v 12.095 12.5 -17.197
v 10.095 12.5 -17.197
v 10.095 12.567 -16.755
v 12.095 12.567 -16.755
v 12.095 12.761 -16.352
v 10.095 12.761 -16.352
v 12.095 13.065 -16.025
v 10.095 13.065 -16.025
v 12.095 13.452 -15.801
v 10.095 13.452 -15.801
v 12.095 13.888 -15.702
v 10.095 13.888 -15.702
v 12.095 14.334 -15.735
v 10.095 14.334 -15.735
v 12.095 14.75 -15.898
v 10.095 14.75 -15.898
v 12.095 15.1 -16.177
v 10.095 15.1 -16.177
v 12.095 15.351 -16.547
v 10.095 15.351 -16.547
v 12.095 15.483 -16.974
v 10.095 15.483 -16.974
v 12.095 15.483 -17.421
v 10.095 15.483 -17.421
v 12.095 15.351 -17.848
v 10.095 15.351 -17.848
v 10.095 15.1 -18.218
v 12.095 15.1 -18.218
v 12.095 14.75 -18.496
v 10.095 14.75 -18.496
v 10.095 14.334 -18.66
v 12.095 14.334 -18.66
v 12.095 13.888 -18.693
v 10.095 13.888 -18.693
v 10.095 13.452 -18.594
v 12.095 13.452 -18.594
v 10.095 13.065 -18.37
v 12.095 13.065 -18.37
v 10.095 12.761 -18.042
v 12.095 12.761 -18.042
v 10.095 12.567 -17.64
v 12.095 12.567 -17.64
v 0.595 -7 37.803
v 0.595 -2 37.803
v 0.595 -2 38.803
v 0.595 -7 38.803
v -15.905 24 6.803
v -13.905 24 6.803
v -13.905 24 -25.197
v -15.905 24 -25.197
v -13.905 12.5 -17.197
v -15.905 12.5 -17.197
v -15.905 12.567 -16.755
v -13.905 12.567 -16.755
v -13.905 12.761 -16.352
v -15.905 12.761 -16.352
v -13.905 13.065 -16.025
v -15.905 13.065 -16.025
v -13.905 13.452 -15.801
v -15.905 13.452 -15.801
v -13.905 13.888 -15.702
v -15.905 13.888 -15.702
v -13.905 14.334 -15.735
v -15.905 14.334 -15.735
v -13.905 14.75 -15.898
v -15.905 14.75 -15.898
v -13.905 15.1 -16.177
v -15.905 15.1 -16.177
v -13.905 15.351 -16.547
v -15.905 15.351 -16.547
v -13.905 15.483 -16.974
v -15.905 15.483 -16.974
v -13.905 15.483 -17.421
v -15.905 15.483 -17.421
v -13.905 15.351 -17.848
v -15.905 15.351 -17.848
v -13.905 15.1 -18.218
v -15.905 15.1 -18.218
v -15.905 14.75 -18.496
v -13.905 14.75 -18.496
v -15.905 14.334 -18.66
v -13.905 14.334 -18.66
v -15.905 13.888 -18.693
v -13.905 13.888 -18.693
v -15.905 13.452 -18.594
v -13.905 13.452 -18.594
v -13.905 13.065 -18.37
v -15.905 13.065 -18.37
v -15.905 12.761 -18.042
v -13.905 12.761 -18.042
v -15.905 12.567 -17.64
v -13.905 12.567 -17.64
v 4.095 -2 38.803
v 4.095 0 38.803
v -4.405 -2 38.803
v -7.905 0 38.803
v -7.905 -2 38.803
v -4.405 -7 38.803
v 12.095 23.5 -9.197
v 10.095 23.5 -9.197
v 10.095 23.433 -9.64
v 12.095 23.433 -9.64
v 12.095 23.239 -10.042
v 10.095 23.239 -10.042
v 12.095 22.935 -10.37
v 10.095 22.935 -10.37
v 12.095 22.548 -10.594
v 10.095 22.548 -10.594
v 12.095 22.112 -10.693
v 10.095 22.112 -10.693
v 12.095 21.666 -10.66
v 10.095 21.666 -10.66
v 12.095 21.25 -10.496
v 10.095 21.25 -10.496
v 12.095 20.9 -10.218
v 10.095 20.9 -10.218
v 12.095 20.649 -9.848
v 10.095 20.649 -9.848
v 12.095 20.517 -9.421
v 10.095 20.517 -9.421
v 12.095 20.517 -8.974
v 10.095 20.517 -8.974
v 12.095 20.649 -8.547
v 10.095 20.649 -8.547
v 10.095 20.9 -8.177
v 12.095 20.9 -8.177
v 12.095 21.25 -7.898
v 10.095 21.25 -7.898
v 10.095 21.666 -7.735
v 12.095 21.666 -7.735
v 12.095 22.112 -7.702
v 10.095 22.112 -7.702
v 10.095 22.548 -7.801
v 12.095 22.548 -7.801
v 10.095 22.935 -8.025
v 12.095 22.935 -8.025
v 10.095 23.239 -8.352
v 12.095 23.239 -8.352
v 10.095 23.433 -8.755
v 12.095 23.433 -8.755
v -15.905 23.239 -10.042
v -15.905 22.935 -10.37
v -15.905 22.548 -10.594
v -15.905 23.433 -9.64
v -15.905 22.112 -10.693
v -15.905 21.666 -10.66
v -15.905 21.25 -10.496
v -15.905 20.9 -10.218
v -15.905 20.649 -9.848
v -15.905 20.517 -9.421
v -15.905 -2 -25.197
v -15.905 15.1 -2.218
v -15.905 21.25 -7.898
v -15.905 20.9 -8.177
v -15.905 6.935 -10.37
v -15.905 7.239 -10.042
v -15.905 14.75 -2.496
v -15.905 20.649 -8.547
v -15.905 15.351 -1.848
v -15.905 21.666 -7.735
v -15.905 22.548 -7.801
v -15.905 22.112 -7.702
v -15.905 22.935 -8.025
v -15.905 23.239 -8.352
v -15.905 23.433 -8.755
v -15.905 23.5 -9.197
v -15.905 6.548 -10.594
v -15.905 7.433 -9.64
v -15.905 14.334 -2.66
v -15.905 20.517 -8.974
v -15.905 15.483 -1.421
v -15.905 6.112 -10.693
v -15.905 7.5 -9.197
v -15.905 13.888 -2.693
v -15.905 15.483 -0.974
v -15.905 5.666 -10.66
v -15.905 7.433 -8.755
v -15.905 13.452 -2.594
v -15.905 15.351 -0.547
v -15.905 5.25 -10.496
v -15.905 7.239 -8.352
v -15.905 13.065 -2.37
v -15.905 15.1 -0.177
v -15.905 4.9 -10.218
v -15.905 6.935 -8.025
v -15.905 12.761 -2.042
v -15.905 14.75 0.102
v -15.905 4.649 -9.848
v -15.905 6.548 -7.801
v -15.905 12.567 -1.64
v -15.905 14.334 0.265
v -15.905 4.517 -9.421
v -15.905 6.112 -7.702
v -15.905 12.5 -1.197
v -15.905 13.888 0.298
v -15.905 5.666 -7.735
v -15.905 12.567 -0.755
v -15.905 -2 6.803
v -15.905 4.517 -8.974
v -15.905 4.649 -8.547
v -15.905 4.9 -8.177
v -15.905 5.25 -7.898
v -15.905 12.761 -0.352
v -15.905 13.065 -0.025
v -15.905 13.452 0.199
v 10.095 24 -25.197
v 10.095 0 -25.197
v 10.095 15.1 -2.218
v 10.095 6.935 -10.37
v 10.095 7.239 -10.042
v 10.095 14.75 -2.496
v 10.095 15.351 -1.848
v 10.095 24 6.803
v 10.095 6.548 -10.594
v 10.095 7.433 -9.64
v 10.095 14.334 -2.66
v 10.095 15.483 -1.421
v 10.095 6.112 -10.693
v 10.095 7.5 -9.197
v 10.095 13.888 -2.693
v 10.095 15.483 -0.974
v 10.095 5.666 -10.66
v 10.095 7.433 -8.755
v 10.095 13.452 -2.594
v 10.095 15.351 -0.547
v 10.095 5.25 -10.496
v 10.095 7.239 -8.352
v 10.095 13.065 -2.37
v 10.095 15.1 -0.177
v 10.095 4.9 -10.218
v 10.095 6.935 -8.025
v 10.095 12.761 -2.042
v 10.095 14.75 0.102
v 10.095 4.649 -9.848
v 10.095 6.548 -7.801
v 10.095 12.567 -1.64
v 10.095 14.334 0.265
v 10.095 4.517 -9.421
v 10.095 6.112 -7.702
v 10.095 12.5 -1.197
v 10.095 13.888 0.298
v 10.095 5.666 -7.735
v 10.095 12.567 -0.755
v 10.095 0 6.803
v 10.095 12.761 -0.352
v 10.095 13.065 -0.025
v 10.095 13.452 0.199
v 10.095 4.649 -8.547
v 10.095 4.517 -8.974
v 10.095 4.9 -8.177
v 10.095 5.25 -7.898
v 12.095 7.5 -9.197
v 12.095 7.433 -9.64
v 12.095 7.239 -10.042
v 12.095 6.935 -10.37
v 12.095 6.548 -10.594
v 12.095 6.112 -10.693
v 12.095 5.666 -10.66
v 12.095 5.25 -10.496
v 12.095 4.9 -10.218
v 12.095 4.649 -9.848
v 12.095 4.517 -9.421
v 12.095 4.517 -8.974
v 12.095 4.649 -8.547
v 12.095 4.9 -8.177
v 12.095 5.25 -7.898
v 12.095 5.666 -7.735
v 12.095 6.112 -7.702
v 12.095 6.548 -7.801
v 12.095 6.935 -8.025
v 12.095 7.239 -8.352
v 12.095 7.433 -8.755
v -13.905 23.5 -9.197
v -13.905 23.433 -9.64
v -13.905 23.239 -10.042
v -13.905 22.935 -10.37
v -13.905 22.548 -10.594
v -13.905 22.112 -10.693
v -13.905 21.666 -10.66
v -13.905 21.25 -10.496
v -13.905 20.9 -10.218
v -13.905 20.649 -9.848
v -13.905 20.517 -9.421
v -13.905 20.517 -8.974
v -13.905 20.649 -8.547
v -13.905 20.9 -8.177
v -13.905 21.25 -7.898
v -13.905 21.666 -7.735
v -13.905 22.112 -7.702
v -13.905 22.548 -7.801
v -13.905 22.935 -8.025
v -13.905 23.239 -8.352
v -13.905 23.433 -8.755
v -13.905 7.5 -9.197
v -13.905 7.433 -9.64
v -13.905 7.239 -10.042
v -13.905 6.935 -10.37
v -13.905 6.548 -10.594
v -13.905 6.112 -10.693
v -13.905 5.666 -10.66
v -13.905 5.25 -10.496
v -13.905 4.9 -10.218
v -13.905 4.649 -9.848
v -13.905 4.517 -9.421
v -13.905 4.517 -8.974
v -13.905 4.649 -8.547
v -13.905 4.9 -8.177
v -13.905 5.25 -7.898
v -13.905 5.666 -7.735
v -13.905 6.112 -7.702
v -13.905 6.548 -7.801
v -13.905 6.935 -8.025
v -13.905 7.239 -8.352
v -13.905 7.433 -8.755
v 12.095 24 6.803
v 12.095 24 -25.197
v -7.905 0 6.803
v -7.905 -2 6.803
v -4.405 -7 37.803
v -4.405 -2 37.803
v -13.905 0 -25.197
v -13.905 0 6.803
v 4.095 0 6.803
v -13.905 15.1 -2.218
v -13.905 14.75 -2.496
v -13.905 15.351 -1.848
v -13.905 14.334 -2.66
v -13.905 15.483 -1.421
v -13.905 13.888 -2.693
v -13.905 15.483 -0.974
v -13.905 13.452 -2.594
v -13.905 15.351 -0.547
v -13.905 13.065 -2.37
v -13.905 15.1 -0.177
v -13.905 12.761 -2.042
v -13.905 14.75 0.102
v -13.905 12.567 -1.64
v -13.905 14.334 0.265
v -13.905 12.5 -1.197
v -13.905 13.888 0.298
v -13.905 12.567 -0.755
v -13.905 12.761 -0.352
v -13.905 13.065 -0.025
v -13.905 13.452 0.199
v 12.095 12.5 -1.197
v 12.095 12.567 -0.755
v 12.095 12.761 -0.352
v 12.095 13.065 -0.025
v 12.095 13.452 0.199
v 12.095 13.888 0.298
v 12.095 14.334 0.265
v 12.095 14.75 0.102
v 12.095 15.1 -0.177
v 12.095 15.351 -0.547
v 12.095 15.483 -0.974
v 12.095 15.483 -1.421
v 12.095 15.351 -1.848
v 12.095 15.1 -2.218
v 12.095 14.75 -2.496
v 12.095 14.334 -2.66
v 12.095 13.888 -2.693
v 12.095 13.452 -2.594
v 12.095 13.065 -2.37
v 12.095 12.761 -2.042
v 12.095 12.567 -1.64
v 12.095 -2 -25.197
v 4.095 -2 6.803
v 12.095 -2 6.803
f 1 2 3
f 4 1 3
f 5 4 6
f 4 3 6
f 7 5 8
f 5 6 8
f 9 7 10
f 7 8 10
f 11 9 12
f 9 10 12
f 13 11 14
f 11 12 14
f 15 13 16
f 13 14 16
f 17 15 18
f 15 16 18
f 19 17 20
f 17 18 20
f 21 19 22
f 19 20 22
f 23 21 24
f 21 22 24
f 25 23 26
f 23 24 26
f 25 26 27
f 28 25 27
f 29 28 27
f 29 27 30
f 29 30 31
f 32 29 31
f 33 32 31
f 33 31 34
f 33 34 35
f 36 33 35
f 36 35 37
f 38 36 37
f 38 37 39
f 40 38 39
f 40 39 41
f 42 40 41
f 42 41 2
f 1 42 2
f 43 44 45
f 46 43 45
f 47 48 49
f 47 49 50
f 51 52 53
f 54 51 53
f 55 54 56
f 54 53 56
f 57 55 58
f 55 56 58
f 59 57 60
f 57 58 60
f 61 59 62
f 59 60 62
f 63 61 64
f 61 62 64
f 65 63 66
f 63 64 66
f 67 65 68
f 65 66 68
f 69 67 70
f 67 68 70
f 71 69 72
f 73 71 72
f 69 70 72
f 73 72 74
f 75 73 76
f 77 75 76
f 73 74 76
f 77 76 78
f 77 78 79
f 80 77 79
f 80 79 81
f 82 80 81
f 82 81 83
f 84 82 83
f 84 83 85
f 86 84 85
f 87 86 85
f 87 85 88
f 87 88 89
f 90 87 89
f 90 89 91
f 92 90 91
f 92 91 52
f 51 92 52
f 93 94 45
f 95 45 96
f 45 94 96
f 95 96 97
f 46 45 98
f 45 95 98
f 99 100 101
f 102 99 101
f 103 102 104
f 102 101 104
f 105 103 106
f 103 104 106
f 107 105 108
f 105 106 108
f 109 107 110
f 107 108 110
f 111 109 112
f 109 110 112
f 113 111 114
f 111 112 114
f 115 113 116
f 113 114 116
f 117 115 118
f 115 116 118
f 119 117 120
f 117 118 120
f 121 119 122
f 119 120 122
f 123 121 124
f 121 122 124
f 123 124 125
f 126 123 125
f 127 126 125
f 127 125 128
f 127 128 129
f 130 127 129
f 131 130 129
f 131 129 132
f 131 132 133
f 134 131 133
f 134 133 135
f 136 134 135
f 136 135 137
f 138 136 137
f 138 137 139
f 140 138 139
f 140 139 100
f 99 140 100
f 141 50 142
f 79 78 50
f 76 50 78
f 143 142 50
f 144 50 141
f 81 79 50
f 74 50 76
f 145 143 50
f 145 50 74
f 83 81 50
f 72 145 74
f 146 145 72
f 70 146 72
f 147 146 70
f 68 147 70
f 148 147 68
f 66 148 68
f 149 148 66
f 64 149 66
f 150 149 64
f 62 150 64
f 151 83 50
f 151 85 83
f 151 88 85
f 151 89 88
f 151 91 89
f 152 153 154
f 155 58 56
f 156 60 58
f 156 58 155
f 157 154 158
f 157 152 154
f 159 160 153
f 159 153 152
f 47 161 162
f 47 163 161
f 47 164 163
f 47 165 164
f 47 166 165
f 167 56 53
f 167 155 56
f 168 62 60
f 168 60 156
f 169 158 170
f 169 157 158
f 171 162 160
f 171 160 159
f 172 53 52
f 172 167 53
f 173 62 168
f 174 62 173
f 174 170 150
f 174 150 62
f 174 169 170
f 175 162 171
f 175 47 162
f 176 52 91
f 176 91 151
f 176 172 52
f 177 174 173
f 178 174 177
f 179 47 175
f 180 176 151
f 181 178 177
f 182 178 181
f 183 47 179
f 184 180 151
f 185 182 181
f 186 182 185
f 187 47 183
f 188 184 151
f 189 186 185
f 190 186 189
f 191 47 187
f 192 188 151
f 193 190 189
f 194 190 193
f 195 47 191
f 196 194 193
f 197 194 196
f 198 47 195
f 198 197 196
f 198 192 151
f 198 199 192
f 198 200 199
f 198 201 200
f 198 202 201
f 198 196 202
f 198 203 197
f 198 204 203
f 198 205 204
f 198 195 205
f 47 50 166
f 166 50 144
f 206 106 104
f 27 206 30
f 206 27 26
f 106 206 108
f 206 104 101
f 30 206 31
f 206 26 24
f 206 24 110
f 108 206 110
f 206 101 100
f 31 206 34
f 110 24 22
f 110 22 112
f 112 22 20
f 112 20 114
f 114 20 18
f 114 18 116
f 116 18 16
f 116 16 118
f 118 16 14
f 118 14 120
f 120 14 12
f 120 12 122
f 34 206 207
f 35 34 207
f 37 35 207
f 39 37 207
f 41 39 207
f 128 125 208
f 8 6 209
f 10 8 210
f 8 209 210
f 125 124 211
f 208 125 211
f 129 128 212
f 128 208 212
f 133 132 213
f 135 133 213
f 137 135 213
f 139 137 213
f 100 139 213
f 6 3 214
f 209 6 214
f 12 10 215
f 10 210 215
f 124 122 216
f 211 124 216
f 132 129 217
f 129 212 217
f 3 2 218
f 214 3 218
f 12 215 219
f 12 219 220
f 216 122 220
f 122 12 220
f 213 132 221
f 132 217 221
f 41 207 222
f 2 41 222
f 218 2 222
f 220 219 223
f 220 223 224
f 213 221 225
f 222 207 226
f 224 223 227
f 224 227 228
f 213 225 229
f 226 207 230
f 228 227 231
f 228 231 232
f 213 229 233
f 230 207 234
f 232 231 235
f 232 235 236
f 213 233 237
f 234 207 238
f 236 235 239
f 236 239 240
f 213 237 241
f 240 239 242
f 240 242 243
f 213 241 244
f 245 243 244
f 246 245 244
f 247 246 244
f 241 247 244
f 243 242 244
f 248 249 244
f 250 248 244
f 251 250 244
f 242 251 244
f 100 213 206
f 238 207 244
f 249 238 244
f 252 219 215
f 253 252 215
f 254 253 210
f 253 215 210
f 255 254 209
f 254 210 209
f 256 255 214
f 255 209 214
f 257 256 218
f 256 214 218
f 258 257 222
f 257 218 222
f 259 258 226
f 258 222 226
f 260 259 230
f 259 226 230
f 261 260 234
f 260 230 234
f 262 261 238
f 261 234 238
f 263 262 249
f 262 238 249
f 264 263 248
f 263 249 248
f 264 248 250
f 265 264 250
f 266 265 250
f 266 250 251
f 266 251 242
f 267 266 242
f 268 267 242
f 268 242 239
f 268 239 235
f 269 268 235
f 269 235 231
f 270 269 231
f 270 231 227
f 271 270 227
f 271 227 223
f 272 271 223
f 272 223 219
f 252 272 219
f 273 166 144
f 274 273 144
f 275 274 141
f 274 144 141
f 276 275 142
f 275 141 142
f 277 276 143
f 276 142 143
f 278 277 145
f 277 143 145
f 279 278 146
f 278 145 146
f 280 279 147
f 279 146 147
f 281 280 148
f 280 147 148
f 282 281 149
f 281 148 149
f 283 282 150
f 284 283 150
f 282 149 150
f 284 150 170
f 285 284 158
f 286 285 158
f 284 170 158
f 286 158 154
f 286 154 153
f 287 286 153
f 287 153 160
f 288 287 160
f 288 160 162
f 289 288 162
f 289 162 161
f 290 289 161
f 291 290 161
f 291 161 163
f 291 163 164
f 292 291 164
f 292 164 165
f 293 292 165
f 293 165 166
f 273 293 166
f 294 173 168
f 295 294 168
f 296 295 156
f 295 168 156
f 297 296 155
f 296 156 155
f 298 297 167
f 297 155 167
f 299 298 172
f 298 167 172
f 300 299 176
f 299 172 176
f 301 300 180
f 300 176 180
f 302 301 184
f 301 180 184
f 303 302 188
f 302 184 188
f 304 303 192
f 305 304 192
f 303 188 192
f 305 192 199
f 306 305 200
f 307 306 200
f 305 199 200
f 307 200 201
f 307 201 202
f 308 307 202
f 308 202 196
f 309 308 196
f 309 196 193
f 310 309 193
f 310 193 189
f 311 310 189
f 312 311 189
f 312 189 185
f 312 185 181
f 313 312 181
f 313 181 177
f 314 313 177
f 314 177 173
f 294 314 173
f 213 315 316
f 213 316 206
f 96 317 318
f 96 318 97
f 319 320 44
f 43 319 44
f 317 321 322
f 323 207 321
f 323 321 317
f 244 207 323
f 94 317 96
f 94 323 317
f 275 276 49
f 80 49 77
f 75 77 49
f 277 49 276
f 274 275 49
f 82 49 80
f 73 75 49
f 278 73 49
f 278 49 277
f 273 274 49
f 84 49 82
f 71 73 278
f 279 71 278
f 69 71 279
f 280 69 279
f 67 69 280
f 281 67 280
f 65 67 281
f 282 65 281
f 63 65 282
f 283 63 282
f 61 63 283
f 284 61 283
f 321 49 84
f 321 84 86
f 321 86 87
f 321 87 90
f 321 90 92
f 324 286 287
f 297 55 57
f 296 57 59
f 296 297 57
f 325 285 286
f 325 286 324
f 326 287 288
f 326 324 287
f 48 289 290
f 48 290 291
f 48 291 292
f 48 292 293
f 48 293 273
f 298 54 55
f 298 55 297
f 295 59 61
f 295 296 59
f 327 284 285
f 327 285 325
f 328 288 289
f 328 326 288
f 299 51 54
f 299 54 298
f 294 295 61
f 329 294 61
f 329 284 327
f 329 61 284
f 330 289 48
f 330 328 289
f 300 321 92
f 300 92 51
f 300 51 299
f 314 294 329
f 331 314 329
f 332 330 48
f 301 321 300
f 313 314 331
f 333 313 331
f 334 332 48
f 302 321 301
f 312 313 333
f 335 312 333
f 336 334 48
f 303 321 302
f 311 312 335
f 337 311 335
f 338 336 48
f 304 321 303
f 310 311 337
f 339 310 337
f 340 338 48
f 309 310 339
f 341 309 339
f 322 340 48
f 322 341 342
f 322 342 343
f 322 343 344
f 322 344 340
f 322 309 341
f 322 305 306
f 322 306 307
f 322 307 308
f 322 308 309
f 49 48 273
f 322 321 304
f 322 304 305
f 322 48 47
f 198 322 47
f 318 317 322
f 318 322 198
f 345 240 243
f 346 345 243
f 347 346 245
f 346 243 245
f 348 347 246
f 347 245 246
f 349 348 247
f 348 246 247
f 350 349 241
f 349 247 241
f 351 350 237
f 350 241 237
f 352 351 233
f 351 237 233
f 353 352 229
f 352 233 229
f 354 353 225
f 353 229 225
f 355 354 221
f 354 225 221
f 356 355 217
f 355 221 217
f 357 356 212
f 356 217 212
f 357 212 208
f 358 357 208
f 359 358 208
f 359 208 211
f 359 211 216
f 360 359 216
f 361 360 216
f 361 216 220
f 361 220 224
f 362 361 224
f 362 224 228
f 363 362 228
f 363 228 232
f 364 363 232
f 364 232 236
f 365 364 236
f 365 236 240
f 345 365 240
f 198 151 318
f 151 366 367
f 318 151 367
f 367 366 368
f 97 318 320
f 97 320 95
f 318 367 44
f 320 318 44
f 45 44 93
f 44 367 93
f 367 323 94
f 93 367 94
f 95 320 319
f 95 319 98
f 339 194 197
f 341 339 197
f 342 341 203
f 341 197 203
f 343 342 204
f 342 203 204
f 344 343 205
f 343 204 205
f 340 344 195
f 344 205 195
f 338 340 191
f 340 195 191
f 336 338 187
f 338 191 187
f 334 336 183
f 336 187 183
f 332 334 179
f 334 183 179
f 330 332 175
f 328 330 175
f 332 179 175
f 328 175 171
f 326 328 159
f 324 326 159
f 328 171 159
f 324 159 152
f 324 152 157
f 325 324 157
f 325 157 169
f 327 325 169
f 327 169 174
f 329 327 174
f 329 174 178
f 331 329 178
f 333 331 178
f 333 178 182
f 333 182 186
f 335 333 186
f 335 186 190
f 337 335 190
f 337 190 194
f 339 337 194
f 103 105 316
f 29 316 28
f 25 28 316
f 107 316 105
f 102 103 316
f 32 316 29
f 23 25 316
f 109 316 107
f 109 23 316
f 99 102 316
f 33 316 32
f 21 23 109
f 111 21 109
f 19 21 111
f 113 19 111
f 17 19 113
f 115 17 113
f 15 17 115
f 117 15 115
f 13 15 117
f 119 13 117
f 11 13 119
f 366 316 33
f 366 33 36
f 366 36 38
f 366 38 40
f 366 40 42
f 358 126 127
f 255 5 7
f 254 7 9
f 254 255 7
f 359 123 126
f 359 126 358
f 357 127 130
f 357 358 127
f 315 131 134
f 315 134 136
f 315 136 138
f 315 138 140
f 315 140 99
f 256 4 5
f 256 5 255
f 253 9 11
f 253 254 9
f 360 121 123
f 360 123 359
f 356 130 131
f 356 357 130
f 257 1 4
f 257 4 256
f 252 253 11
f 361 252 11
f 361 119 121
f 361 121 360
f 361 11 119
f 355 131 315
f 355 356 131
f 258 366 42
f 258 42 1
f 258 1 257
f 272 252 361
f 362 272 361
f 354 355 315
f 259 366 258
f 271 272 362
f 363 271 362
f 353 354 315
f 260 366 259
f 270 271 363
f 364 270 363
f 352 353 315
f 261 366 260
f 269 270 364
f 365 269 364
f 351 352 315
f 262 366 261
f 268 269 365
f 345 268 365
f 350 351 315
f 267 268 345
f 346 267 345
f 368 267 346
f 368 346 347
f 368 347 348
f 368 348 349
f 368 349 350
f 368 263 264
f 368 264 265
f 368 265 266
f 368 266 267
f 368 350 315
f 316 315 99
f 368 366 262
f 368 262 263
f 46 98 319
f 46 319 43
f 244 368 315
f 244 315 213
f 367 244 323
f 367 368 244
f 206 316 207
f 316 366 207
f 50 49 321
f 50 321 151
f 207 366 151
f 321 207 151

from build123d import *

# Parameters (mm, degrees)
F0_W      = 12
F0_H      = 64
F1_DEPTH  = 2
F2_W      = 2
F2_H      = 32
F3_DEPTH  = 8
F4_W      = 2
F4_H      = 32
F5_DEPTH  = 8
F6_W      = 5
F6_H      = 2
F7_DEPTH  = 5
F8_W      = 5
F8_H      = 1
F9_DEPTH  = 16.501
F10_W     = 2
F10_H     = 32
F11_DEPTH = 24
F12_R     = 1.5
F13_DEPTH = 28.001


with BuildPart() as f1:
    # F0 (on Front) → F1 (new body)
    with BuildSketch(Plane.XZ):
        with Locations((-1.9052418647, 6.8026150874)):
            Rectangle(F0_W, F0_H)
    extrude(amount=F1_DEPTH)

    # F2 (on face) → F3 (join)
    with BuildSketch(Plane.YZ.offset(4.0947581353)):
        with Locations((-1, -9.1973849126)):
            Rectangle(F2_W, F2_H)
    extrude(amount=F3_DEPTH)

    # F4 (on face) → F5 (join)
    with BuildSketch(Plane(origin=(-7.9052418647, 0, 0), x_dir=(0, -1, 0), z_dir=(-1, 0, 0))):
        with Locations((1, -9.1973849126)):
            Rectangle(F4_W, F4_H)
    extrude(amount=F5_DEPTH)

    # F6 (on face) → F7 (join)
    with BuildSketch(Plane.XZ.offset(2)):
        with Locations((-1.9052418647, 38.8026150874)):
            Rectangle(F6_W, F6_H)
    extrude(amount=F7_DEPTH)

    # F8 (on face) → F9 (cut, through all)
    with BuildSketch(Plane(origin=(-4.4052418647, 0, 0), x_dir=(0, -1, 0), z_dir=(-1, 0, 0))):
        with Locations((4.5, 39.3026150874)):
            Rectangle(F8_W, F8_H)
    extrude(amount=-F9_DEPTH, mode=Mode.SUBTRACT)

    # F10 (on face) → F11 (join)
    with BuildSketch(Plane(origin=(0, 0, 0), x_dir=(-1, 0, 0), z_dir=(0, 1, 0))):
        with Locations((-11.0947581353, -9.1973849126)):
            Rectangle(F10_W, F10_H)
        with Locations((14.9052418647, -9.1973849126)):
            Rectangle(F10_W, F10_H)
    extrude(amount=F11_DEPTH)

    # F12 (on face) → F13 (cut, through all)
    with BuildSketch(Plane(origin=(-15.9052418647, 0, 0), x_dir=(0, -1, 0), z_dir=(-1, 0, 0))):
        with Locations((-14, -1.1973849126)):
            Circle(F12_R)
        with Locations((-14, -17.1973849126)):
            Circle(F12_R)
        with BuildLine():
            Line((-23.5, -9.1973849126), (-20.5, -9.1973849126))
            ThreePointArc((-20.5, -9.1973849126), (-22, -7.6973849126), (-23.5, -9.1973849126))
        make_face()
        with BuildLine():
            ThreePointArc((-4.5, -9.1973849126), (-6, -7.6973849126), (-7.5, -9.1973849126))
            Line((-7.5, -9.1973849126), (-4.5, -9.1973849126))
        make_face()
        with BuildLine():
            Line((-4.5, -9.1973849126), (-7.5, -9.1973849126))
            ThreePointArc((-7.5, -9.1973849126), (-6, -10.6973849126), (-4.5, -9.1973849126))
        make_face()
        with BuildLine():
            ThreePointArc((-23.5, -9.1973849126), (-22, -10.6973849126), (-20.5, -9.1973849126))
            Line((-20.5, -9.1973849126), (-23.5, -9.1973849126))
        make_face()
    extrude(amount=-F13_DEPTH, mode=Mode.SUBTRACT)


solid = f1.part
